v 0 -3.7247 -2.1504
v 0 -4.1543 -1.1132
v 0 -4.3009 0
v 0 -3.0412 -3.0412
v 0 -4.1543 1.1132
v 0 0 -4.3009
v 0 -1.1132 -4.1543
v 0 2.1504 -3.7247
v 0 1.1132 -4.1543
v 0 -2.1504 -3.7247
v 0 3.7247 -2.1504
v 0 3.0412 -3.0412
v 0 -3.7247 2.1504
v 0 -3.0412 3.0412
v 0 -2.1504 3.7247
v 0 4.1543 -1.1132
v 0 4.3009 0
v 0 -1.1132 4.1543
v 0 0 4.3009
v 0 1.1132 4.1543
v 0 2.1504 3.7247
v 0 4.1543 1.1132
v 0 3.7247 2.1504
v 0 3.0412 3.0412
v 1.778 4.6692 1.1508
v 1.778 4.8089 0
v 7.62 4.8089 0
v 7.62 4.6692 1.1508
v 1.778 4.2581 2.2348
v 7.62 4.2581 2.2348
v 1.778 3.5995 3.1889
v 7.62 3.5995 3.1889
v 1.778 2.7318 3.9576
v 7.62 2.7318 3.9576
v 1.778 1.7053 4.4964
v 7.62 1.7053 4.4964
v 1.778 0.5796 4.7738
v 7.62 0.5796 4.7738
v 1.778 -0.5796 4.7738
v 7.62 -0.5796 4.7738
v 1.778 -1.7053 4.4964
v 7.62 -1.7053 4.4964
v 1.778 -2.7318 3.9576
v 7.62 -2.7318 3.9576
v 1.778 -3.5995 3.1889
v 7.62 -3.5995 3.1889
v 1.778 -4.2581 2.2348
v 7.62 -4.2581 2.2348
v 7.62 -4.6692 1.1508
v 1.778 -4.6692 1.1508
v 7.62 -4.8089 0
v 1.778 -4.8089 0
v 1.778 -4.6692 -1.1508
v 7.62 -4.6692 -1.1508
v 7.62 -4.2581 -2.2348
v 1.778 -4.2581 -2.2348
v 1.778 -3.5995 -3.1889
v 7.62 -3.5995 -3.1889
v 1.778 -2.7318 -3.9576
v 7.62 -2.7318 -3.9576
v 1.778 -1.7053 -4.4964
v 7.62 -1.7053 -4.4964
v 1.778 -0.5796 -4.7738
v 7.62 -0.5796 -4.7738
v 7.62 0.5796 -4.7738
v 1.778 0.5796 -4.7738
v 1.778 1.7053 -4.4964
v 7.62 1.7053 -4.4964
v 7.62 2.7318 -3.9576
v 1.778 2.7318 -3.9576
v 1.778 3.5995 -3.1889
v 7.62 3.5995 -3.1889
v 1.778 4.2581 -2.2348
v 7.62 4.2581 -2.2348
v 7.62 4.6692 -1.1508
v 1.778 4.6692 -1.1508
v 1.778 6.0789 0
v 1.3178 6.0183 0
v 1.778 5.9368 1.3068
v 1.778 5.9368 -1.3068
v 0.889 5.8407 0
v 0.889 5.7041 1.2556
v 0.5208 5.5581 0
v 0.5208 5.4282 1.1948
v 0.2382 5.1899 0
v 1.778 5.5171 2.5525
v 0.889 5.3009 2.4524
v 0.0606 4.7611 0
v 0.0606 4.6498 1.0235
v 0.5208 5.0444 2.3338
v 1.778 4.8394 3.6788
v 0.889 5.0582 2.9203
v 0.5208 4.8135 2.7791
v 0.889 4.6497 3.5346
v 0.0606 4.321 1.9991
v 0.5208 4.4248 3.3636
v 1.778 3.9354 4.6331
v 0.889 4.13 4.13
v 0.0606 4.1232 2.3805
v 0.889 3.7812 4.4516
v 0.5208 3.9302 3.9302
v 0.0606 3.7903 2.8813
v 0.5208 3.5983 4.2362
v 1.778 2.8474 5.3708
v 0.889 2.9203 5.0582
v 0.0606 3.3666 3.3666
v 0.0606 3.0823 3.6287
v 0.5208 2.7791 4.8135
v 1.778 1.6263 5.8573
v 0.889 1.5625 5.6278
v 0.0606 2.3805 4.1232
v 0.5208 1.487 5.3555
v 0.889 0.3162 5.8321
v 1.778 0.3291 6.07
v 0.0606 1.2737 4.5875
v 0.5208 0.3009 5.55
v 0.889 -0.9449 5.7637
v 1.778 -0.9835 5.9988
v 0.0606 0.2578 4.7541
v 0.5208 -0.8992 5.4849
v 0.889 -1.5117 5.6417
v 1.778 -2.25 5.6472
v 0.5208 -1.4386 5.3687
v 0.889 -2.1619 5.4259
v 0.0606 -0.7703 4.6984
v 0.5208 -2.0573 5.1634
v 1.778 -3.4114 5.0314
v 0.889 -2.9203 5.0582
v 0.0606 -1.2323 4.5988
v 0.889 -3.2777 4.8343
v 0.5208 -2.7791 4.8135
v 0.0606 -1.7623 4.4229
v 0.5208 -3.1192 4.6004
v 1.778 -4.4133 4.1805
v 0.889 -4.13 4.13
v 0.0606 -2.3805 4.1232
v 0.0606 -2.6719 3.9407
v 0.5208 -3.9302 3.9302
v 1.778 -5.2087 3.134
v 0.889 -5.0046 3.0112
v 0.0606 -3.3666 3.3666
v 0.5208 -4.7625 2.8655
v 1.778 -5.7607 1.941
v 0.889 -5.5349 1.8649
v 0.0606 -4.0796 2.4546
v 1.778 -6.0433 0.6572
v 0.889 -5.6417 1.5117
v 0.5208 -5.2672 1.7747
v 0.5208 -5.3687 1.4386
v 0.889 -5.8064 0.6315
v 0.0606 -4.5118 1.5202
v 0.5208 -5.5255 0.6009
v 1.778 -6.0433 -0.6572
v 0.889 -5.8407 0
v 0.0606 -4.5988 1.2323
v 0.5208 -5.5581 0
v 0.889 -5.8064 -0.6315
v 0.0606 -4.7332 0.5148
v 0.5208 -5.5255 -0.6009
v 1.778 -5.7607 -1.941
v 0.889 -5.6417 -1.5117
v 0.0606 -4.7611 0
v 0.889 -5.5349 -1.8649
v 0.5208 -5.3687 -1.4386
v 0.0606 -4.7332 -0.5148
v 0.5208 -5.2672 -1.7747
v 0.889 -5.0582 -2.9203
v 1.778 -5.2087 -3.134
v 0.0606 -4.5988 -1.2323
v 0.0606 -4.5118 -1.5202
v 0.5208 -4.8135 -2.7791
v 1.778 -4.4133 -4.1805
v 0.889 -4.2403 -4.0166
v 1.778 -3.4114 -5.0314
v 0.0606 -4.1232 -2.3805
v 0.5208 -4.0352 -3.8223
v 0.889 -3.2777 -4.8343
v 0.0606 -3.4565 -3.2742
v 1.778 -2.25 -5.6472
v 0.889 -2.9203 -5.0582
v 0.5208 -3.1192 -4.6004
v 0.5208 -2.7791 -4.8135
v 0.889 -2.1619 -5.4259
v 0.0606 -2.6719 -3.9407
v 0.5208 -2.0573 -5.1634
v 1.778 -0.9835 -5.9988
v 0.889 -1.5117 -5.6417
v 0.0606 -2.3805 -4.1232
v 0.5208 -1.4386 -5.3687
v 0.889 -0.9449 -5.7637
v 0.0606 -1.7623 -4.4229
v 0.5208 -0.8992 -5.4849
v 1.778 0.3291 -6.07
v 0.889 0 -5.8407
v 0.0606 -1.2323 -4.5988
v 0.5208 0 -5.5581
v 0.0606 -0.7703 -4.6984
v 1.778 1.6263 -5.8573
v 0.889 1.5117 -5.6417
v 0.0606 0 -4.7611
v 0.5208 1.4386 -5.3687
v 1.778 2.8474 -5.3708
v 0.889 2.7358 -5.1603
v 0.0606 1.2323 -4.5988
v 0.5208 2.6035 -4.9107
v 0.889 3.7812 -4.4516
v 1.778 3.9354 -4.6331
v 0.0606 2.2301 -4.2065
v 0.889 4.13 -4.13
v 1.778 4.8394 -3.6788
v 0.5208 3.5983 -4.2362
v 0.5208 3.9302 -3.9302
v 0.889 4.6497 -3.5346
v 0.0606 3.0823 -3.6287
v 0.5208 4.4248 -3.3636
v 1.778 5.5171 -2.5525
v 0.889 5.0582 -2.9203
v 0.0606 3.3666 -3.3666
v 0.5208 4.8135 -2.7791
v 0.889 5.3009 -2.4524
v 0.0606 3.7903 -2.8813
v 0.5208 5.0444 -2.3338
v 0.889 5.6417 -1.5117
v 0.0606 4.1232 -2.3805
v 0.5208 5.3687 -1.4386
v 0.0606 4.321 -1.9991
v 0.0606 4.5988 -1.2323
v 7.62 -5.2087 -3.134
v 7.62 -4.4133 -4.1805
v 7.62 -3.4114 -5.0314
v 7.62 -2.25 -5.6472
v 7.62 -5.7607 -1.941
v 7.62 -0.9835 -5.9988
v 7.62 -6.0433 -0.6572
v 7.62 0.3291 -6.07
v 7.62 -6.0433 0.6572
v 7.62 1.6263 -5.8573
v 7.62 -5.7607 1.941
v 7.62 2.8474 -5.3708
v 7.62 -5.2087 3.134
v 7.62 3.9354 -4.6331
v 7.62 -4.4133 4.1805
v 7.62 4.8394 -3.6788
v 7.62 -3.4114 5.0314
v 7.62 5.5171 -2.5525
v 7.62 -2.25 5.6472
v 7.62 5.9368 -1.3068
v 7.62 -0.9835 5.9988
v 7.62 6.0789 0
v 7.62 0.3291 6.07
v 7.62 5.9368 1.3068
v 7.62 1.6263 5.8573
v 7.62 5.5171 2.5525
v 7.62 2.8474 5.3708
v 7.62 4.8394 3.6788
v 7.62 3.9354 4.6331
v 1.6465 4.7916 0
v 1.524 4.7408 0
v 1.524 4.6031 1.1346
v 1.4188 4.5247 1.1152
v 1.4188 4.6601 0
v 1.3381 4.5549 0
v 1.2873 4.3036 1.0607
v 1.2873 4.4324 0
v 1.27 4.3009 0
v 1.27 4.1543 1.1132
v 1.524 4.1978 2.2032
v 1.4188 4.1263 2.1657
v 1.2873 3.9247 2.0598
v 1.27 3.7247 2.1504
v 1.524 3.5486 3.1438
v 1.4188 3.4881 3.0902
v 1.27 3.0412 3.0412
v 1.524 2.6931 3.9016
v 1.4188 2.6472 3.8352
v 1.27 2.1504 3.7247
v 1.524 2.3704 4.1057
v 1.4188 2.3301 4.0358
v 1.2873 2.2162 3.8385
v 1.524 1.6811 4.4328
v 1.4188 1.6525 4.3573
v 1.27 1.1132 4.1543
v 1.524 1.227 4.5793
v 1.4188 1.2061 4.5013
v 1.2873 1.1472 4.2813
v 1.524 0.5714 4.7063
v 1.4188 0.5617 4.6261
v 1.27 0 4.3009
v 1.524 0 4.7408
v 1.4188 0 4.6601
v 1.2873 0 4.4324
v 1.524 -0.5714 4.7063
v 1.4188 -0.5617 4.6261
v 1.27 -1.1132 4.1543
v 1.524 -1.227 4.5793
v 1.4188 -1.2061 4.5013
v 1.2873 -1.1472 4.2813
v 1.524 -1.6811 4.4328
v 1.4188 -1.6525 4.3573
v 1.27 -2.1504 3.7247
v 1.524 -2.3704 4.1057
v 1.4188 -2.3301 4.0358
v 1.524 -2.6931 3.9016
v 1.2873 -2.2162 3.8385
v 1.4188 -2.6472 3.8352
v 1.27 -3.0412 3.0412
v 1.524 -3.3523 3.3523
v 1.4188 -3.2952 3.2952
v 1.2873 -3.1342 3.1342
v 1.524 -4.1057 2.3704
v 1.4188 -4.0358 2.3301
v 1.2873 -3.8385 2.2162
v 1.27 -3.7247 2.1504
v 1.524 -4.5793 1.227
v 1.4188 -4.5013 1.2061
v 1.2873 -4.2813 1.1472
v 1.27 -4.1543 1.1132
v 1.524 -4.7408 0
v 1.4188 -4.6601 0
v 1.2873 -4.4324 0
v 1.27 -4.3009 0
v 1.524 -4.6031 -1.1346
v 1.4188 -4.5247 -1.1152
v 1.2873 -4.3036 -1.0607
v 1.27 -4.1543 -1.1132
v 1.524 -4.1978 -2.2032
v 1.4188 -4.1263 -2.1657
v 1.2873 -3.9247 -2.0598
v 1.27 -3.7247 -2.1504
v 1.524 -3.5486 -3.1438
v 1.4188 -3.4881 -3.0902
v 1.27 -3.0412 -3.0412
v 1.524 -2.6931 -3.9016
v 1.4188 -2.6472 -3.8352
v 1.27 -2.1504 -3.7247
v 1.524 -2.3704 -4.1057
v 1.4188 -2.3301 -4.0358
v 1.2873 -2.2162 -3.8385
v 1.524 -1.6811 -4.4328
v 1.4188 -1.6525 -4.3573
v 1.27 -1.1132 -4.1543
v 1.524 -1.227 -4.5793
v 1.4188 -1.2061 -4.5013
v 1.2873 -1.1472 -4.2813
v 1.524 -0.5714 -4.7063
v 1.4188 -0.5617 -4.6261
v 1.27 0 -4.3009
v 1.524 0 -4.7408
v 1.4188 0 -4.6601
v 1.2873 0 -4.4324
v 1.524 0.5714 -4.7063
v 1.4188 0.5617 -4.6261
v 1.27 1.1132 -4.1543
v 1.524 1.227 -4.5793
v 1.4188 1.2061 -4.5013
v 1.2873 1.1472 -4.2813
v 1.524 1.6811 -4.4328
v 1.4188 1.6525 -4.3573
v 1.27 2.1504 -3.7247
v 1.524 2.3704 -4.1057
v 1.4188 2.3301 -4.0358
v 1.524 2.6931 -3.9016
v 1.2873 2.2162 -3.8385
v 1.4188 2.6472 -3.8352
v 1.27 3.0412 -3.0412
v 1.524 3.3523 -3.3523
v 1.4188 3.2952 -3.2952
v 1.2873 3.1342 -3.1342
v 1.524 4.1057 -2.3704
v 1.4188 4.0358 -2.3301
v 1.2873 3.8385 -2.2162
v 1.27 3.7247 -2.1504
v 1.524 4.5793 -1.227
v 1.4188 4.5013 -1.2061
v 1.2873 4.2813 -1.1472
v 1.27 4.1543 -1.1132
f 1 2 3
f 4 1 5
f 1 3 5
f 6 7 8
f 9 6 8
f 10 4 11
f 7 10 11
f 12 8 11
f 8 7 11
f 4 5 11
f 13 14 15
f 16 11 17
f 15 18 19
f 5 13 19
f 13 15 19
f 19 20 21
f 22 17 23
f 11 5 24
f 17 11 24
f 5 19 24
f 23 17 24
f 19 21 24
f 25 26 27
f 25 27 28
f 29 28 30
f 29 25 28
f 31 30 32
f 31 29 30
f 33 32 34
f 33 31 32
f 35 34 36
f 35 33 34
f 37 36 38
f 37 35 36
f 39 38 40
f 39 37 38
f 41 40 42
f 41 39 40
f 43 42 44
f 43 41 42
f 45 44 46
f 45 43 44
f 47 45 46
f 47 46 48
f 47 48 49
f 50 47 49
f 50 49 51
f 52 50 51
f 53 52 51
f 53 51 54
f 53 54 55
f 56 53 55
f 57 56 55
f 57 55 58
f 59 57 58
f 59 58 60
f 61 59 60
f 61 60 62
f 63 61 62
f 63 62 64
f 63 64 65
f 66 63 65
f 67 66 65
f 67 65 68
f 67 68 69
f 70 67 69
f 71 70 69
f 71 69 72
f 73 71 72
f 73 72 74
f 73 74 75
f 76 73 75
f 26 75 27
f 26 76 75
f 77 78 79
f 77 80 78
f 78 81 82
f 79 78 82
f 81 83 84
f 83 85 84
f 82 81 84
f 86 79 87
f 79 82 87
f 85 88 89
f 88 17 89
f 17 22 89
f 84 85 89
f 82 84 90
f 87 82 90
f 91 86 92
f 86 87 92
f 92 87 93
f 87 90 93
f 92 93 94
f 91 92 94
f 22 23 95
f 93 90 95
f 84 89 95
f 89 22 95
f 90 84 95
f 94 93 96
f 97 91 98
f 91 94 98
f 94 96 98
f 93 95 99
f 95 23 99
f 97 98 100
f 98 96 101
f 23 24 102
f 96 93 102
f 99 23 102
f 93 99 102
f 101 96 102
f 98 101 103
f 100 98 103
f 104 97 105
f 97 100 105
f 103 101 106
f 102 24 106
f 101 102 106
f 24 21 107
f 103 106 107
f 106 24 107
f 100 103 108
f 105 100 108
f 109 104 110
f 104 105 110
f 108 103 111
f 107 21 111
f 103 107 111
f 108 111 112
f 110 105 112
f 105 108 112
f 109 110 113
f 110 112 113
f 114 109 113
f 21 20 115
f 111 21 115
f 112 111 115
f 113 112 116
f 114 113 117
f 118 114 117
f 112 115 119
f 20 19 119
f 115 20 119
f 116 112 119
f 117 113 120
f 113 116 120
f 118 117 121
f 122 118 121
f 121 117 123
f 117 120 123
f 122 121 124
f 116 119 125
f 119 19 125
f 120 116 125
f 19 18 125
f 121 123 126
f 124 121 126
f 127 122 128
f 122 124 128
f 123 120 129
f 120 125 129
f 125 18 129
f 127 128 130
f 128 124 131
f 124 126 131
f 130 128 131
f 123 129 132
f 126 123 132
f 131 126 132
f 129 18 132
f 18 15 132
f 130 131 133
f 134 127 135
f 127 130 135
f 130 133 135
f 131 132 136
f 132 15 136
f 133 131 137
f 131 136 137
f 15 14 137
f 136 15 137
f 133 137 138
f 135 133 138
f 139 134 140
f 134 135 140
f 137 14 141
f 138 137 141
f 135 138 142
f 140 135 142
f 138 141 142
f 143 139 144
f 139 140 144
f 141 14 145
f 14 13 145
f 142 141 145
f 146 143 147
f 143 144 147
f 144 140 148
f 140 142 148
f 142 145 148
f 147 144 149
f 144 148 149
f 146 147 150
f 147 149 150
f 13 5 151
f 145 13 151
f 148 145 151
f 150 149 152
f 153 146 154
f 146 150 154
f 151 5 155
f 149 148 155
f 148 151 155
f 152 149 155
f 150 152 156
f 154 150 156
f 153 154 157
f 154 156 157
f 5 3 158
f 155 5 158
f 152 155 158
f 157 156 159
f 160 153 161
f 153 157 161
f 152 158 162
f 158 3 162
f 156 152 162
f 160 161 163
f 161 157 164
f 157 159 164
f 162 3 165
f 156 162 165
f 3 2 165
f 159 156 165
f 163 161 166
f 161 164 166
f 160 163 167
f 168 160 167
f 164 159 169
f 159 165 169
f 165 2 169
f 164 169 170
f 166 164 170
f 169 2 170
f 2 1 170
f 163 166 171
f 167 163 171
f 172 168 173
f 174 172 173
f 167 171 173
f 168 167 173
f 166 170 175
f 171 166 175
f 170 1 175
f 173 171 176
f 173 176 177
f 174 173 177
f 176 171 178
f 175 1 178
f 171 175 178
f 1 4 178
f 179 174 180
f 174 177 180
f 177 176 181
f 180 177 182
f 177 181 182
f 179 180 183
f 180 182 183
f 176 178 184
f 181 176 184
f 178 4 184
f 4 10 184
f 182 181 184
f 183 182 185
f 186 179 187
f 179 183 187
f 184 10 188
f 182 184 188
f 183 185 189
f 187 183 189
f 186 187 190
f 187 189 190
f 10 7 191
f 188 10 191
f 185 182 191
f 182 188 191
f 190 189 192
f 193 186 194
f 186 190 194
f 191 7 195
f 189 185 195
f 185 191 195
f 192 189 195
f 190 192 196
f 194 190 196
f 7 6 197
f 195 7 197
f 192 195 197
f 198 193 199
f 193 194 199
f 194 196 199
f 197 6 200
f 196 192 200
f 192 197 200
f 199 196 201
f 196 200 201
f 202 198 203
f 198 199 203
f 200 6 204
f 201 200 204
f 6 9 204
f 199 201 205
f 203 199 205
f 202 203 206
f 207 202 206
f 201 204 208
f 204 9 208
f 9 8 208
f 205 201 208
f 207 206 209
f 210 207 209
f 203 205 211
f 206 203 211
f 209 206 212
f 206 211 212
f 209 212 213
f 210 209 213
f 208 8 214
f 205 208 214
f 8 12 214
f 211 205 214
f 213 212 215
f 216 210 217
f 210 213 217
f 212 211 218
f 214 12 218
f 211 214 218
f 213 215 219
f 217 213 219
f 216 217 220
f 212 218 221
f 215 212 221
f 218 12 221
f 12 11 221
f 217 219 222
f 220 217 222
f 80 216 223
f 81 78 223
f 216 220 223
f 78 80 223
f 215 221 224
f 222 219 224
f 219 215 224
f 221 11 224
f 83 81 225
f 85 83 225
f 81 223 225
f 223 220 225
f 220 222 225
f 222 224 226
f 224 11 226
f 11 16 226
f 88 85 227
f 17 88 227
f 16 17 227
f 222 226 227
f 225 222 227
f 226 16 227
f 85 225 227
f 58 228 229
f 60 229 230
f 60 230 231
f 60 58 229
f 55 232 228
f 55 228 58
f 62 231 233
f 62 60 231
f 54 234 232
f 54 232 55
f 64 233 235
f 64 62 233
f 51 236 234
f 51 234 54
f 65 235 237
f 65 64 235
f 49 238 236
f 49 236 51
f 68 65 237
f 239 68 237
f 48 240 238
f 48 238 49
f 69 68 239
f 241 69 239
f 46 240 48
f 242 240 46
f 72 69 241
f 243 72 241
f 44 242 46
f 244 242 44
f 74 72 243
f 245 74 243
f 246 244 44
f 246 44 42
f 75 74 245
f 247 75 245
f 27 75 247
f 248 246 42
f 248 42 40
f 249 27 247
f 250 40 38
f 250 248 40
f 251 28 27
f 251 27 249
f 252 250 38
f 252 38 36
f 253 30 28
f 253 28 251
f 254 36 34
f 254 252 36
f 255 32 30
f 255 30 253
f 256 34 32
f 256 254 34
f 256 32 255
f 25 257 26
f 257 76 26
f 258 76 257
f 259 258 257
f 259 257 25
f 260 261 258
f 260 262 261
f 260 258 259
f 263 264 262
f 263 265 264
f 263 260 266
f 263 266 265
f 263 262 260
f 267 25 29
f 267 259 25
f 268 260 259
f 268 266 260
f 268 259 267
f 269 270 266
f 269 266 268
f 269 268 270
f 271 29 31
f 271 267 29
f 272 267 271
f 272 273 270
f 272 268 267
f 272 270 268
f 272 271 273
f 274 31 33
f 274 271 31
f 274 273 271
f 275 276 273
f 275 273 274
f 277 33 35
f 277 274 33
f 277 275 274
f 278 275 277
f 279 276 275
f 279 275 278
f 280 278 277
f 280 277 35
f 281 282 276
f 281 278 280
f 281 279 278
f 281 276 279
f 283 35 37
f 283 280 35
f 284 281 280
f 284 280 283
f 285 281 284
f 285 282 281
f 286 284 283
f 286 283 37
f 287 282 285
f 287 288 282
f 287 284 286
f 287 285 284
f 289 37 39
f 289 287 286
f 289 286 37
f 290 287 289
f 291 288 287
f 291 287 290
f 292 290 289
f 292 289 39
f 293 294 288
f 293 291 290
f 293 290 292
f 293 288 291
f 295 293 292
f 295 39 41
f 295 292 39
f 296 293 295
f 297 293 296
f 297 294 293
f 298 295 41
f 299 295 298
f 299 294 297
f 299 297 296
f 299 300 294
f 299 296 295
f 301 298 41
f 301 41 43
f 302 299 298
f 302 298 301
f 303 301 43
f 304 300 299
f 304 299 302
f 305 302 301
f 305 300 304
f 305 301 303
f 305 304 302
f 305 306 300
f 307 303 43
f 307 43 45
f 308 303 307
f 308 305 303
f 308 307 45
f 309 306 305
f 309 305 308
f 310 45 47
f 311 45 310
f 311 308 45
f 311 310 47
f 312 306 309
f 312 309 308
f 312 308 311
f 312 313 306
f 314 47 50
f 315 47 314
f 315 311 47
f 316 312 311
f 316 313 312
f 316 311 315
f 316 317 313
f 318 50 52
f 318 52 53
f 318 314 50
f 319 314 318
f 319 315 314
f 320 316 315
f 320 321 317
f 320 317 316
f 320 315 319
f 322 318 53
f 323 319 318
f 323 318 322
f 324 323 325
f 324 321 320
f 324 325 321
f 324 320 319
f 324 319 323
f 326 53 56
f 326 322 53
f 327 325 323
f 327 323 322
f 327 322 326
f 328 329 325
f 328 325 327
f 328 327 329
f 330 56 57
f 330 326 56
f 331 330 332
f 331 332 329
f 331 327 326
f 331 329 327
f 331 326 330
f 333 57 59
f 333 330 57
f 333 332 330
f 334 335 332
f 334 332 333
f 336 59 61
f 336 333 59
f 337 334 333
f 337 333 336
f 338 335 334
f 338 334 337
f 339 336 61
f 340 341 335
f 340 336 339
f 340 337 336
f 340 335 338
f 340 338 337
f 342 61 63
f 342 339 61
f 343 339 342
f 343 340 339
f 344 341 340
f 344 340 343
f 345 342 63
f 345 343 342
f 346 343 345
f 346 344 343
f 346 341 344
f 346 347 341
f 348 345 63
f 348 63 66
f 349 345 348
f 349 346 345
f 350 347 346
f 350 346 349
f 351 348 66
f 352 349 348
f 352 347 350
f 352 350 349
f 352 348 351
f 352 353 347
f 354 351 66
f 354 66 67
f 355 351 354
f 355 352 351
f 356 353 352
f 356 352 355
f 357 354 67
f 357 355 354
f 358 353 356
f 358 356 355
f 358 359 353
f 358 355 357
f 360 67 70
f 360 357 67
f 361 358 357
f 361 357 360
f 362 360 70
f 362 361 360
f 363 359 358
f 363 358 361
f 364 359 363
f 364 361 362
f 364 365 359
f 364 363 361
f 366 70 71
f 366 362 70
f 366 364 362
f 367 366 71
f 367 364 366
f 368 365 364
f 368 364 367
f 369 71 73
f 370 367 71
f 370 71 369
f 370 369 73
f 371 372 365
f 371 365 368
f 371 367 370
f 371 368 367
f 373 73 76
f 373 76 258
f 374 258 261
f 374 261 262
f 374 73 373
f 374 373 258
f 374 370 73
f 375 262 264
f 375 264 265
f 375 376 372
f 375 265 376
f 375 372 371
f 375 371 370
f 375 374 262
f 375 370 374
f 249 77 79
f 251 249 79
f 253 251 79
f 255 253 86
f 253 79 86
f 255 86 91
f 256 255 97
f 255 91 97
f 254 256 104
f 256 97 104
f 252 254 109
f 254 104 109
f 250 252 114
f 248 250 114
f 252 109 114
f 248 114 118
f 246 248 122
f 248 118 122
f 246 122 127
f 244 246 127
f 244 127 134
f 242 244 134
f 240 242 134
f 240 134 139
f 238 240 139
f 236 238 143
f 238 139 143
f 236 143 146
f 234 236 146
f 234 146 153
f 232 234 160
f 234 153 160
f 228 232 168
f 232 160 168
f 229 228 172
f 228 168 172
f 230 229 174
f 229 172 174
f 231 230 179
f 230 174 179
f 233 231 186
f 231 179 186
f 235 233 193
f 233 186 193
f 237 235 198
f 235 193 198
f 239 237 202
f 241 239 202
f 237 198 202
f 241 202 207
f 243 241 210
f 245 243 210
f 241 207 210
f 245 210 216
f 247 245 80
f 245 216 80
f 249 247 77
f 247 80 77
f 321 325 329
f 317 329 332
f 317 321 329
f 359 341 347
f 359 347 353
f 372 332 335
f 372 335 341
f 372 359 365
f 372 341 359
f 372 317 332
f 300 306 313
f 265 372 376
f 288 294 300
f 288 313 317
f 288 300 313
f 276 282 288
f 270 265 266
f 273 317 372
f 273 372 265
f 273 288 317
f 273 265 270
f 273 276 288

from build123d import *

# Parameters (mm, degrees)
F0_R     = 6.078895
F1_DEPTH = 7.62
F2_R     = 1.778
F3_T     = -1.27


with BuildPart() as f1:
    # F0 (on Right) → F1 (new body)
    with BuildSketch(Plane.YZ):
        Circle(F0_R)
    extrude(amount=F1_DEPTH)

    # F2
    f2_edges = [f1.edges().sort_by_distance(p)[0] for p in [
        (0, -6.078895, 0),
    ]]
    fillet(f2_edges, radius=F2_R)

    # F3
    f3_openings = [f1.faces().sort_by_distance(p)[0] for p in [
        (7.62, 0, 0),
    ]]
    offset(amount=F3_T, openings=f3_openings)


solid = f1.part
